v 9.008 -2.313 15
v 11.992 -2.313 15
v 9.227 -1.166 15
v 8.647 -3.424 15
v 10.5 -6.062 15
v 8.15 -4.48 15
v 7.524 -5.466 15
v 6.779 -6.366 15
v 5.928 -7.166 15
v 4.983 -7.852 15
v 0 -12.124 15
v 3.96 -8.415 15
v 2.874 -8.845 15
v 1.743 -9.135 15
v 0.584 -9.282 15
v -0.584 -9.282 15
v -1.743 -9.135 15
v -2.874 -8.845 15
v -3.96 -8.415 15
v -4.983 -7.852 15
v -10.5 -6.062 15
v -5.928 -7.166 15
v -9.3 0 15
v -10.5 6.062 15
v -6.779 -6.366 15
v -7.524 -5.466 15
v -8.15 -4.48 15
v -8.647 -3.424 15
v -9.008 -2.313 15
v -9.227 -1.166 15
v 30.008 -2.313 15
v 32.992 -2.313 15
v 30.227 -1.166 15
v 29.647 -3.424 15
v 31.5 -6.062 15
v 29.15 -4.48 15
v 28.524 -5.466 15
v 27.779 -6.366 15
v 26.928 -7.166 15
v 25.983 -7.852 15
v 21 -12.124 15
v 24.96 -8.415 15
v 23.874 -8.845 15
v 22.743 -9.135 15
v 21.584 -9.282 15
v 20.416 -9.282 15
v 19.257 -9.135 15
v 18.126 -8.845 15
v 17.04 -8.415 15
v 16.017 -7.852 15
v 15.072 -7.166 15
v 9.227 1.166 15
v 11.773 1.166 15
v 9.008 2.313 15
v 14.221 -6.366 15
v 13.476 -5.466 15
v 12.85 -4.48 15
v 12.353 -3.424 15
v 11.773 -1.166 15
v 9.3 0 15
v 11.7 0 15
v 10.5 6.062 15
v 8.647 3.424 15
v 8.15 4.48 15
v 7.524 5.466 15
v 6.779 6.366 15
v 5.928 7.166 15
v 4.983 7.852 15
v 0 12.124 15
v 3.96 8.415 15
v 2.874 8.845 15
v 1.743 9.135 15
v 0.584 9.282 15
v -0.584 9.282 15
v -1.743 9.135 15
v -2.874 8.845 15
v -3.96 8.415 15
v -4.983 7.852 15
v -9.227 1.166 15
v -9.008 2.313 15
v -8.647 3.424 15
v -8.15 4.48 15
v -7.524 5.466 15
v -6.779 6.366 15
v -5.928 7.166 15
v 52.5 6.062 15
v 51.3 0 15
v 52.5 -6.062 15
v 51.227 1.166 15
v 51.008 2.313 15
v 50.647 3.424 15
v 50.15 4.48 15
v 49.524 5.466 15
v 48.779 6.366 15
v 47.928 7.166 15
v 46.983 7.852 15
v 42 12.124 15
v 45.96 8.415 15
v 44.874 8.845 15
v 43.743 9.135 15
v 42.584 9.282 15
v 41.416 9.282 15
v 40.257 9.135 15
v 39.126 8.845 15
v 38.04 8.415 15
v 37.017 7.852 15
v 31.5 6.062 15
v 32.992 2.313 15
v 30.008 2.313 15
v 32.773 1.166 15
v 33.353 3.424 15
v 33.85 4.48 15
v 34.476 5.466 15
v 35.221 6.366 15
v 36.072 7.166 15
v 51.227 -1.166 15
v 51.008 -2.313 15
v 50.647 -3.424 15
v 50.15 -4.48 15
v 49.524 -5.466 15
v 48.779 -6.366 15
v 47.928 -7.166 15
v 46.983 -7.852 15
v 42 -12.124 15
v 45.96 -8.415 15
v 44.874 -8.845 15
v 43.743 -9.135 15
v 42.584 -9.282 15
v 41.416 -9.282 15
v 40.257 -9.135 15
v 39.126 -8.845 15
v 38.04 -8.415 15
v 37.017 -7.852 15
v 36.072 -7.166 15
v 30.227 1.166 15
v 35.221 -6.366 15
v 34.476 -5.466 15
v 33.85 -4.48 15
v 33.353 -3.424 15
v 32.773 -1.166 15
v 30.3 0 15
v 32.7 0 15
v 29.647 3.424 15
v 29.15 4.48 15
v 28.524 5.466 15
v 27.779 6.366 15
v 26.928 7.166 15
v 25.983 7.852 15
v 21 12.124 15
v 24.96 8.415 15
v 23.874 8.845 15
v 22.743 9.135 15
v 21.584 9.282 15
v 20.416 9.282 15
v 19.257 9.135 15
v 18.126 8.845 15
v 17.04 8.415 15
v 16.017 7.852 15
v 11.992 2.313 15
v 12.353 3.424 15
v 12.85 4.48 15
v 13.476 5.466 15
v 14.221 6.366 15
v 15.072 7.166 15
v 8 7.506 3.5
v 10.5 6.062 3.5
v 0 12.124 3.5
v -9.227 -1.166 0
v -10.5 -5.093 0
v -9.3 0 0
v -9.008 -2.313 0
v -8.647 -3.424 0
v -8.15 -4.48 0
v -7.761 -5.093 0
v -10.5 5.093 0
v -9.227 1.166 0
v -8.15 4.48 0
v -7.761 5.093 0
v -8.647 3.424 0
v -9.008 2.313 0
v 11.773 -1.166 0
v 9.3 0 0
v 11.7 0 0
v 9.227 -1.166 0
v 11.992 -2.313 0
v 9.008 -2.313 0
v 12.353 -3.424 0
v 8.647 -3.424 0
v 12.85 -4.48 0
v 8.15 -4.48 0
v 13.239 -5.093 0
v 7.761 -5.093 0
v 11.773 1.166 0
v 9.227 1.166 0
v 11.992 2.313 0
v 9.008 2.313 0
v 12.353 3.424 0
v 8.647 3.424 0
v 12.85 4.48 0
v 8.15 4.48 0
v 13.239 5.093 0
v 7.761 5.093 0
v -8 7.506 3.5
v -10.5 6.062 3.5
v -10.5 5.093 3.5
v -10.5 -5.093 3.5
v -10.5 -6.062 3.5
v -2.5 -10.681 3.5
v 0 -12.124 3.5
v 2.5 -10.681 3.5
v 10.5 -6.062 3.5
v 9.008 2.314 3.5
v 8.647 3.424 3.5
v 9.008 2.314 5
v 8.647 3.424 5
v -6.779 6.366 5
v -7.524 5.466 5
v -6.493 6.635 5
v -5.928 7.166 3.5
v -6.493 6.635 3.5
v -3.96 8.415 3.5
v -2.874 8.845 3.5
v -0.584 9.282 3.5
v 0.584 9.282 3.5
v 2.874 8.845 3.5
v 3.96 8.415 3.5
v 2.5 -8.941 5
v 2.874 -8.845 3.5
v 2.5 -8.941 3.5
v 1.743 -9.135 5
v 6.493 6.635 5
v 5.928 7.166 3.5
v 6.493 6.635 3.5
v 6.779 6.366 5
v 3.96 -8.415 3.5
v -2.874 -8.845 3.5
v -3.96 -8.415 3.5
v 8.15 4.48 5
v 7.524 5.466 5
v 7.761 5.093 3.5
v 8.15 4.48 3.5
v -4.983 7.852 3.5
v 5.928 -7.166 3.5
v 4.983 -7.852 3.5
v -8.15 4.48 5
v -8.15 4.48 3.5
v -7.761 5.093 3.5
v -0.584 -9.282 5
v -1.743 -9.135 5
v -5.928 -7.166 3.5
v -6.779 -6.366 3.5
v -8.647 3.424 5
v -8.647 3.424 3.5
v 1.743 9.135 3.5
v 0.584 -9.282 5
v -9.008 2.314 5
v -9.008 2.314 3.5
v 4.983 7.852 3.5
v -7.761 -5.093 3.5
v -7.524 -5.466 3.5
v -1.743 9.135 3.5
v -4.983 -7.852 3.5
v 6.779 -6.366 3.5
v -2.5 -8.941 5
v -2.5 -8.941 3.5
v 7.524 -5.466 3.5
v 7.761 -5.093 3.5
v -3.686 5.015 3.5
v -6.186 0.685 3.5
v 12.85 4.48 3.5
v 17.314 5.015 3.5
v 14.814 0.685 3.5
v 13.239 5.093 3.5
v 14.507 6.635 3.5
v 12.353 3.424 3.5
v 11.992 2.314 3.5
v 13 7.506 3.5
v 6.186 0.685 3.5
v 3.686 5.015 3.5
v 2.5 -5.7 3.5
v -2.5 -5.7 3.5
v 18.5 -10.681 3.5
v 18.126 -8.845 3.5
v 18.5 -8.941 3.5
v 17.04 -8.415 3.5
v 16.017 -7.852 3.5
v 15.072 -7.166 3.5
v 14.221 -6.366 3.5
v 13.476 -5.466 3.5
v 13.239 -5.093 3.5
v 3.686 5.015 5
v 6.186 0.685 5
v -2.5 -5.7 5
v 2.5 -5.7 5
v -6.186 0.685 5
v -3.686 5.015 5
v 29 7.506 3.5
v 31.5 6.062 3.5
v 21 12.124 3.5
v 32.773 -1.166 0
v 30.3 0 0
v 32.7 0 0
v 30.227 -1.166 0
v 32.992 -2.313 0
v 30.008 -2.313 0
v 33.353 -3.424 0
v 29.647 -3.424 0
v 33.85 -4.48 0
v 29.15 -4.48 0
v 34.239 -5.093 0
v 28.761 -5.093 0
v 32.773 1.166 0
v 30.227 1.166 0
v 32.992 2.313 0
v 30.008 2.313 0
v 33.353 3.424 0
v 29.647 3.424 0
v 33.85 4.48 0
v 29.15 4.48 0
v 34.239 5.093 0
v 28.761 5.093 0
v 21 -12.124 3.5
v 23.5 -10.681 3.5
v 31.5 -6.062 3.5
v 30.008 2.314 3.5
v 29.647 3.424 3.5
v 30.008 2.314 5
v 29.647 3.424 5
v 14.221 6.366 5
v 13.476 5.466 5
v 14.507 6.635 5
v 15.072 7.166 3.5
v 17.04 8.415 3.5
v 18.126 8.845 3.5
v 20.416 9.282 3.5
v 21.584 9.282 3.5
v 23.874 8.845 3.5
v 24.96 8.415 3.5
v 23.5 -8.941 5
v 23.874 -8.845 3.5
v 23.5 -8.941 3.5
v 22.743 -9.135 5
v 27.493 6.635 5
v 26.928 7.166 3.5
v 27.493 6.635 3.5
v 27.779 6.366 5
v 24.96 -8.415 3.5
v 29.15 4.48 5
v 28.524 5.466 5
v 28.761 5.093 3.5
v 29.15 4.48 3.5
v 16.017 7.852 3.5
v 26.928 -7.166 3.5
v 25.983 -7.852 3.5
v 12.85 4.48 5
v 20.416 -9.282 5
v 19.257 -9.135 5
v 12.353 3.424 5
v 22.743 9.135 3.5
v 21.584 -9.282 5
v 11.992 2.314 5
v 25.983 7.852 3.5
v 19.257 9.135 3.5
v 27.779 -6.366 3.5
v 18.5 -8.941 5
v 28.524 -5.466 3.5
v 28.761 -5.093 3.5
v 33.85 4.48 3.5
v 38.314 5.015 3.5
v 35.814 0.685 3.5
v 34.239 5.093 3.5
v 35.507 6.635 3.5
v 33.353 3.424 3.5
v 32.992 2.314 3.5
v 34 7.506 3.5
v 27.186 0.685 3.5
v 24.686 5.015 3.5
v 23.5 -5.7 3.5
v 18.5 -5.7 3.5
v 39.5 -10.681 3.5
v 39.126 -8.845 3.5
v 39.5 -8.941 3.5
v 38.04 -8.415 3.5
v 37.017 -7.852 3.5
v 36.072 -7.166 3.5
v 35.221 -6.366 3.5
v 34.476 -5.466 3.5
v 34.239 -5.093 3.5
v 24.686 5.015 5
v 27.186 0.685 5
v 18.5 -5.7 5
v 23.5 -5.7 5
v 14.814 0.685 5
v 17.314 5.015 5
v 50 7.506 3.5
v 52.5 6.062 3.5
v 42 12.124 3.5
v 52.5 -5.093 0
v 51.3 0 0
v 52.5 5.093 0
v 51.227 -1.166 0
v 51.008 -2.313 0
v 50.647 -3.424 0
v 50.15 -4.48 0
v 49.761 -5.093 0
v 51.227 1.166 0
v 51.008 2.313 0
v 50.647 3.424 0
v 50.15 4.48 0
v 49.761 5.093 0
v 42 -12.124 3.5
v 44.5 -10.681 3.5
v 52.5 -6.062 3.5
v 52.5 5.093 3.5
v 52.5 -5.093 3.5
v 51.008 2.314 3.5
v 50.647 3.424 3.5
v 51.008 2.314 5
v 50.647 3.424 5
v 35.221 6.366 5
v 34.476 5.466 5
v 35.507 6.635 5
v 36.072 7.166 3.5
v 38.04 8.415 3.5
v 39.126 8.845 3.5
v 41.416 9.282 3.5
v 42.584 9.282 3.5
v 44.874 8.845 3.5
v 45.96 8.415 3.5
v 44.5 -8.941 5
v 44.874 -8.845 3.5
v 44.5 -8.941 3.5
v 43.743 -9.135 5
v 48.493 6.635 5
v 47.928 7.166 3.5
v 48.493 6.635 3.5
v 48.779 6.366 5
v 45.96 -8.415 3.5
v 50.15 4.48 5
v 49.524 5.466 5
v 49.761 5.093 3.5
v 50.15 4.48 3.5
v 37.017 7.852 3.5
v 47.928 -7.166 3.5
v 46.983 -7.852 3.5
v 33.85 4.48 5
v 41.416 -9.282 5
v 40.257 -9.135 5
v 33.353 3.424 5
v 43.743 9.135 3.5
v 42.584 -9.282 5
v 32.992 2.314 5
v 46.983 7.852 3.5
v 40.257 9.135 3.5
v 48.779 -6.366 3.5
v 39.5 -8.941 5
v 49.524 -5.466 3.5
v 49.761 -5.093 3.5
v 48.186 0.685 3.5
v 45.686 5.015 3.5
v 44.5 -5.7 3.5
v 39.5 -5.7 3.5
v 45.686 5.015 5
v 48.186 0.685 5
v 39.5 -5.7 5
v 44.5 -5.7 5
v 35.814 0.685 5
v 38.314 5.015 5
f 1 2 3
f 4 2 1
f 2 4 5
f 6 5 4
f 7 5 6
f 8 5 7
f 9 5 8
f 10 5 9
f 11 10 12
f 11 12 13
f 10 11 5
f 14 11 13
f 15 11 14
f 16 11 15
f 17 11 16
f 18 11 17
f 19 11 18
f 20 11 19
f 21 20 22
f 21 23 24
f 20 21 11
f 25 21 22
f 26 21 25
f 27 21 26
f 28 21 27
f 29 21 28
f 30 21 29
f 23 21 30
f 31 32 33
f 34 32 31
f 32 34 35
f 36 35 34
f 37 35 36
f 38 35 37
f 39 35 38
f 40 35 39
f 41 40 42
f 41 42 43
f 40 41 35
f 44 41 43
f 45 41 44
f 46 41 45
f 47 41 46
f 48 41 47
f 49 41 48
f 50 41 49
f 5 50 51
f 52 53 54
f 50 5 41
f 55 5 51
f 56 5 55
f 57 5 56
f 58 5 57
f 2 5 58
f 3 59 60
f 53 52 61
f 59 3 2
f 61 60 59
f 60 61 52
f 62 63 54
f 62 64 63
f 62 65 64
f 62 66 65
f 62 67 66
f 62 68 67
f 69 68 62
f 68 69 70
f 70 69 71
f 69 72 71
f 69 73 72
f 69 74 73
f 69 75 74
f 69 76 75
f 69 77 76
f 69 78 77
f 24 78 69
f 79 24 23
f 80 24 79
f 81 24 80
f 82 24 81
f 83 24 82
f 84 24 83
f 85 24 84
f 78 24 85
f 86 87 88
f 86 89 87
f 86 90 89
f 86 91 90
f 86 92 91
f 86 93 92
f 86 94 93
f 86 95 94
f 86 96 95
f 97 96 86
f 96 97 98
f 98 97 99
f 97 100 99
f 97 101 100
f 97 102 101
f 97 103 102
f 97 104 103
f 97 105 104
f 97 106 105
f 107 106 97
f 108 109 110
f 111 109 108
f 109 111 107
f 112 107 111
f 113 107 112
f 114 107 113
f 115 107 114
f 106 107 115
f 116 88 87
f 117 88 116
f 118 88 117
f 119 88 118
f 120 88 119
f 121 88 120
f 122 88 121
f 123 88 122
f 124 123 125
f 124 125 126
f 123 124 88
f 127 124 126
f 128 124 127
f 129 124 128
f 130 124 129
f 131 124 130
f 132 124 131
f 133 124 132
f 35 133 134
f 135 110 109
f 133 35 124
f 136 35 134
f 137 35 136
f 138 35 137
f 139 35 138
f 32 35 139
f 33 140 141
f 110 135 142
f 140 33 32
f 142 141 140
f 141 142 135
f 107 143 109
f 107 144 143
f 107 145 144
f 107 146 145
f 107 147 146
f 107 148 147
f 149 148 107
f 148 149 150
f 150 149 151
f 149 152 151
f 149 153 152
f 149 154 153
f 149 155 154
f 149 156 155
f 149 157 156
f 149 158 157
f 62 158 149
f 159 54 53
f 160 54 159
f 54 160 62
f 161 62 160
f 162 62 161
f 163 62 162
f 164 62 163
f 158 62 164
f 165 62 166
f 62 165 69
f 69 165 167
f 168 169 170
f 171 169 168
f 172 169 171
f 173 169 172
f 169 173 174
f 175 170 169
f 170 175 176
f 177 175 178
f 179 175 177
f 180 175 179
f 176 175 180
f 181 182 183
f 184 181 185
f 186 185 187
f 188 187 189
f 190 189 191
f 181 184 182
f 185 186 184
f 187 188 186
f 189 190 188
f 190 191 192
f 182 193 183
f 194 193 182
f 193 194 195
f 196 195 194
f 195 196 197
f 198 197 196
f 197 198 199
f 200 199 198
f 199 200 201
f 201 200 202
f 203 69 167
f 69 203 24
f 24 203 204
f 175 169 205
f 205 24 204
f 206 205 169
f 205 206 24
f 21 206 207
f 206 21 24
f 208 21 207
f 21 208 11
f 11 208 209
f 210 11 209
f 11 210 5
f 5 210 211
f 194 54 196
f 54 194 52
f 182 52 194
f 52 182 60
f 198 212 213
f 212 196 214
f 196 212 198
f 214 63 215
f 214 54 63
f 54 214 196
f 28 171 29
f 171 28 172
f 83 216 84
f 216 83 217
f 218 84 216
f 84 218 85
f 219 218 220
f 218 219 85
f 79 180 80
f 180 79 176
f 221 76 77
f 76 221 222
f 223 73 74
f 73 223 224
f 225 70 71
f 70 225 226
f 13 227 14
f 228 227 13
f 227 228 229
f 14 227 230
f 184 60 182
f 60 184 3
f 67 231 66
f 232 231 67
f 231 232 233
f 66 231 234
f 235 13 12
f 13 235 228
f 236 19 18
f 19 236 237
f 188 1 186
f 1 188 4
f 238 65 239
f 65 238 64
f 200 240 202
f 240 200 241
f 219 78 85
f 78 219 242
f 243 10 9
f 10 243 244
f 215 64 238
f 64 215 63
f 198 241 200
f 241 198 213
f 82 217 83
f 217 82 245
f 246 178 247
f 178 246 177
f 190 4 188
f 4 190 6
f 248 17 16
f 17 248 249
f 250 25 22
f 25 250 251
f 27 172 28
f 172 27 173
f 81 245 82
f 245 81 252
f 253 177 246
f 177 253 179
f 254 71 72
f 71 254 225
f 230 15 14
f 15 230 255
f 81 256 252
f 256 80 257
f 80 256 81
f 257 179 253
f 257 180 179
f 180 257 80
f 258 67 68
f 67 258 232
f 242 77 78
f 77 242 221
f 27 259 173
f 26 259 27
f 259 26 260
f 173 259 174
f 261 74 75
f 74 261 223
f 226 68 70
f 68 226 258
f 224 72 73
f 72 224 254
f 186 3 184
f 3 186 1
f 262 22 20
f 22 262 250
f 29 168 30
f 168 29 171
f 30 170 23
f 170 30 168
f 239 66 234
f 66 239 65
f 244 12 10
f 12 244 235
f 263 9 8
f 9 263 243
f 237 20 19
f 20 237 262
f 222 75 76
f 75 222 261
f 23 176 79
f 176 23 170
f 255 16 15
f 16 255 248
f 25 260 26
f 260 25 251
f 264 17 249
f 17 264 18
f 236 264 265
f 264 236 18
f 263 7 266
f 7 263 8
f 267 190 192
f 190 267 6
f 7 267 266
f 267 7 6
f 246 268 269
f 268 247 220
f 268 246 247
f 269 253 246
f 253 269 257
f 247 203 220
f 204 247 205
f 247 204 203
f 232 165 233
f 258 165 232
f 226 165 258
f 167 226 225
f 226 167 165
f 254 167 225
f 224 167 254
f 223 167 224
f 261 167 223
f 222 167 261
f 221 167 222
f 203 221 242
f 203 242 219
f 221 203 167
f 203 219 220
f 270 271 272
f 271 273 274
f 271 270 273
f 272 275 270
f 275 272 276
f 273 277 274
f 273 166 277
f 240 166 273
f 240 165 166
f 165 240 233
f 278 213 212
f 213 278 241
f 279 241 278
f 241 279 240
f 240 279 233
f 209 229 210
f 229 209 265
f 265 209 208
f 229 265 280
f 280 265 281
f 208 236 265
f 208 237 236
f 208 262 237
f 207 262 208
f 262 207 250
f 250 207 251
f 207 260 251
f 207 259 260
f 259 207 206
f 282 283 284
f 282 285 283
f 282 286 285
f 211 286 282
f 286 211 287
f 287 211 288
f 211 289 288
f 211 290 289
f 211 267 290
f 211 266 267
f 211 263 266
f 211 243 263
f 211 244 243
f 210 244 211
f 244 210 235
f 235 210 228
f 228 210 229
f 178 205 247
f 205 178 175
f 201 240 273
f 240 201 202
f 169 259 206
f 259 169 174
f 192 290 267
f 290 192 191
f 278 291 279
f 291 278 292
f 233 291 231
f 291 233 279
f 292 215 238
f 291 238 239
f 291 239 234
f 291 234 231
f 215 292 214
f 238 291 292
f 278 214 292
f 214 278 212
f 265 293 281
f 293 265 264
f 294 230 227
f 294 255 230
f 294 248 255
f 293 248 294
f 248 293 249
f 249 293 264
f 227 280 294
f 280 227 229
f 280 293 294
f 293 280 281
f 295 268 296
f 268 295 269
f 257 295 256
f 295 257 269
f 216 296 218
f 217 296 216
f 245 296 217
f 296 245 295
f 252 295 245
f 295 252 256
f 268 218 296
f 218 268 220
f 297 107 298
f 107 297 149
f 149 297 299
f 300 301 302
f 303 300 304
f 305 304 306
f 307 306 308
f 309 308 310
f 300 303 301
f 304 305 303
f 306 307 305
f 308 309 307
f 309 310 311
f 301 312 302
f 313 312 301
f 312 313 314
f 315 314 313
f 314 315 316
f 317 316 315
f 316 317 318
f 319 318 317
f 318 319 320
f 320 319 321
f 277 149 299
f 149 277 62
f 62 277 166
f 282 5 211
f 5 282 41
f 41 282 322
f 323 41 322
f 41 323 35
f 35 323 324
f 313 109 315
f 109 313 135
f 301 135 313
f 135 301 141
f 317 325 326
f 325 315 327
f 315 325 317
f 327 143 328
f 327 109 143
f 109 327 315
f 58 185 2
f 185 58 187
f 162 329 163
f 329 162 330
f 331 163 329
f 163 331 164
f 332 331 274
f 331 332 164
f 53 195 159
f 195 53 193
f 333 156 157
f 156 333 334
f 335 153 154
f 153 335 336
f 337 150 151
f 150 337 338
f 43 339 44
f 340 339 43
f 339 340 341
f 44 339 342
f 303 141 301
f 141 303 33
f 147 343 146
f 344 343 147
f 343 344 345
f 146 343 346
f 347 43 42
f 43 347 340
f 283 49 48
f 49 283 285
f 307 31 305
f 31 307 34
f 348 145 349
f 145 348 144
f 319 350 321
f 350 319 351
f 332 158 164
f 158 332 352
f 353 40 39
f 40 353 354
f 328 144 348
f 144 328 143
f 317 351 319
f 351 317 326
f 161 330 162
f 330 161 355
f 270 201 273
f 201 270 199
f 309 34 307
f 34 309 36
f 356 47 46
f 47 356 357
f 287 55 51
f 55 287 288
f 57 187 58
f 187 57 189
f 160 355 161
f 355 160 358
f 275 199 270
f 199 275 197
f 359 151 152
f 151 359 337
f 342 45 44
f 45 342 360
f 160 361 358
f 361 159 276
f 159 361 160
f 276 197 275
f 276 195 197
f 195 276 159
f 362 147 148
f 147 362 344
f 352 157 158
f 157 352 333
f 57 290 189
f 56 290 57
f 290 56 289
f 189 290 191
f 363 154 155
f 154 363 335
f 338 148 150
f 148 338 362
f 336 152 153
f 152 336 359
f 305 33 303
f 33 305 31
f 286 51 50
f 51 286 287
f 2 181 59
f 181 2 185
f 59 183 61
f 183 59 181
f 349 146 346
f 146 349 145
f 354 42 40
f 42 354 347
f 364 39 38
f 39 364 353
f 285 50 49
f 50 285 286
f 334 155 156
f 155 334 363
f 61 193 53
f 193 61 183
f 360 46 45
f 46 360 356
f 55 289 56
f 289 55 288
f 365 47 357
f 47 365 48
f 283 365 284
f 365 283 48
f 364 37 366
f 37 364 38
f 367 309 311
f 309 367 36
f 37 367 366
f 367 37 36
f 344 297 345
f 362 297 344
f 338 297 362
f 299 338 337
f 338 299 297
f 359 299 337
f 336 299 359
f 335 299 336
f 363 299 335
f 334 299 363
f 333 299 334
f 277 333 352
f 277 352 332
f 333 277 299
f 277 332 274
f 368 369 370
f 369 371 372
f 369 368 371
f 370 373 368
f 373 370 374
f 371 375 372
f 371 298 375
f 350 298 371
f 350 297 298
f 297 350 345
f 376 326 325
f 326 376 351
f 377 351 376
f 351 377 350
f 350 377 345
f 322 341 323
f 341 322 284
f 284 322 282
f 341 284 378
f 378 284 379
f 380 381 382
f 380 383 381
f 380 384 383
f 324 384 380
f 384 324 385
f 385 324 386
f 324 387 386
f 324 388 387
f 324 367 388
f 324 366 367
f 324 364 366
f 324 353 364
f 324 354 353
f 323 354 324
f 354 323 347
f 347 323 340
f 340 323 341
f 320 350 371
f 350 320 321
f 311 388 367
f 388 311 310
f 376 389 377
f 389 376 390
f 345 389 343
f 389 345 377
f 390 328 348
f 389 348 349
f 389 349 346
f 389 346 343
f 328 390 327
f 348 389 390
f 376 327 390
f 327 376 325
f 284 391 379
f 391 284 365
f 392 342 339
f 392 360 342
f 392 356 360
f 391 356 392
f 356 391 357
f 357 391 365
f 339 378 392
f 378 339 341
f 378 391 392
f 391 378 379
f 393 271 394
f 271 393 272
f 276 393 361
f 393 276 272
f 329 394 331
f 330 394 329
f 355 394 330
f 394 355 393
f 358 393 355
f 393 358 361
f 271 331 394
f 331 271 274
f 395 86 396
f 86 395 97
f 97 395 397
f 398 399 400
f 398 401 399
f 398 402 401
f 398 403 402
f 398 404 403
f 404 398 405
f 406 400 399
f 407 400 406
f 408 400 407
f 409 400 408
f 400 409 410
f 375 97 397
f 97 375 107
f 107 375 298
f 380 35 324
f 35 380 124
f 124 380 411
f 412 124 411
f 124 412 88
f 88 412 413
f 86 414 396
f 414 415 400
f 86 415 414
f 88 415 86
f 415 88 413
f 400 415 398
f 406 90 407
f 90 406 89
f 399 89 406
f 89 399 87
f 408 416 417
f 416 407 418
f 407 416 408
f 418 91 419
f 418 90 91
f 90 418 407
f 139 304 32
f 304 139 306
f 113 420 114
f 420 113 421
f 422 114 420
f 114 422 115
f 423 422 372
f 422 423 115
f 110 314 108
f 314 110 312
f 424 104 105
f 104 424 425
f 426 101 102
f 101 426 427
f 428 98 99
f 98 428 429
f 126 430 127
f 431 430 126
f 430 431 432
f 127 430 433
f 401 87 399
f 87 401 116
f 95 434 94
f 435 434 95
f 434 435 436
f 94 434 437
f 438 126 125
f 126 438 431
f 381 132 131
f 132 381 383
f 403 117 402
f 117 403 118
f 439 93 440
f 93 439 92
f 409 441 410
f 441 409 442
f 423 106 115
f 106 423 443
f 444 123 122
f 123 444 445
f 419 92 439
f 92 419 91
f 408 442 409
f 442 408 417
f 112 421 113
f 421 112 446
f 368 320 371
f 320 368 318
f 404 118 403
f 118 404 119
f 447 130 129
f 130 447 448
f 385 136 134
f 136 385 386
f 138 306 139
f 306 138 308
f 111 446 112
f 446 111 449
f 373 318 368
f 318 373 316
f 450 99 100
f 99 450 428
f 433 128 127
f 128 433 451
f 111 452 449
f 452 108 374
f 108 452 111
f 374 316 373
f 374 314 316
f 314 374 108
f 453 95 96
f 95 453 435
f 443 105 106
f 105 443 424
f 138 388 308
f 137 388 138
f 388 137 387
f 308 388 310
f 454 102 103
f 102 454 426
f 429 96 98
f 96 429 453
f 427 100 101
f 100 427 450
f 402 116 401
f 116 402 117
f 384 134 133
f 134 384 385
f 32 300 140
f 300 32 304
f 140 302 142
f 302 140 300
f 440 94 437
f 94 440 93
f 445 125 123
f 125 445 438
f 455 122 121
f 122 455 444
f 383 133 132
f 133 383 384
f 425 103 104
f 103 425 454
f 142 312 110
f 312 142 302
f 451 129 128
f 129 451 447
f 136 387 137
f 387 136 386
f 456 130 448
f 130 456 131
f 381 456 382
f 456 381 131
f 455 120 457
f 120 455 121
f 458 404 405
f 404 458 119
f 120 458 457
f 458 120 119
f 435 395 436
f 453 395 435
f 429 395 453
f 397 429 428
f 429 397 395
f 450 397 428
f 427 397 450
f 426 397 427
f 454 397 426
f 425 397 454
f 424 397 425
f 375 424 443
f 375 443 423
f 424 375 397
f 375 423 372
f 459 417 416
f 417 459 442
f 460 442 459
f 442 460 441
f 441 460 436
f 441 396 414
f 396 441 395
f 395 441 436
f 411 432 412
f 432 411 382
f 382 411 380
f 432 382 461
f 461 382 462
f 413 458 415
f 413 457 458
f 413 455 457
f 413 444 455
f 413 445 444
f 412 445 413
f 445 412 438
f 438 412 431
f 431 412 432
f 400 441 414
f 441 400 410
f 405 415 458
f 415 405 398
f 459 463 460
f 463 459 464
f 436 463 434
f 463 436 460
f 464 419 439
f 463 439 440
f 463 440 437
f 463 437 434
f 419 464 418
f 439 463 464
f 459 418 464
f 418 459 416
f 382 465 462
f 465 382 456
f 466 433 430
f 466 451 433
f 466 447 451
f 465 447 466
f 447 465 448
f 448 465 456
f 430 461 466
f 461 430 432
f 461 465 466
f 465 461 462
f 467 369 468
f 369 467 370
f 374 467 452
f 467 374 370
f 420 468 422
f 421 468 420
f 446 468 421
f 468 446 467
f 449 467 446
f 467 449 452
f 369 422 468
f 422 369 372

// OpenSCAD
// https://github.com/Addy771/Hex-Cell-Holder
// This script generates models of cell holders and caps for 
// building battery packs using cylindrical cells. 
// Original concept by ES user "SpinningMagnets"
// More info can be found here:
// https://endless-sphere.com/forums/viewtopic.php?f=3&t=90058
//
// This file was created by Addy and is released as public domain
// Contributors
// Albert Phan - Added boxes and optimizations


///////////////////////////////////////////////////////////////////////////////////////////////////////////
// BASIC CONFIGURATION
/////////////////////////////////////////////////////////////////////////////////////////////////////////////


cell_dia = 18.6;    // Cell diameter default = 18.4 for 18650s **PRINT OUT TEST FIT PIECE STL FIRST**
cell_height = 65;	// Cell height default = 65 for 18650s
wall = 1.2;         // Wall thickness around a single cell. Make as a multiple of the nozzle diameter. Spacing between cells is twice this amount. default = 1.2

num_rows = 1;       
num_cols = 3;

holder_height = 15; // Total height of cell holder default = 15
slot_height = 3.5;  // Height of all slots default = 3.5 mm is a good size for 14 awg solid in slots


col_slot_width = 4; // Width of slots between rows default = 6
row_slot_width = 8; // Width of slots along rows default = 6

pack_style = "rect";	// "rect" for rectangular pack, "para" for parallelogram

wire_style = "bus";		// "strip" to make space to run nickel strips between cells.
						// "bus" to make space for bus wires between rows

box_style = "boLT";		// "bolt" for bolting the box pack together
						// "ziptie" for using zipties to fasten the box together. (ziptie heads will stick out), 
						// "both" uses bolts for the 4 corners and zipties inbetween. Useful for mounting the pack to something with zipties but while still using bolts to hold it together

part_type = "normal";   // "normal","mirrored", or "both". "assembled" is used for debugging.  You'll want a mirrored piece if the tops and bottom are different ( ie. When there are even rows in rectangular style or any # of rows in parallelogram. The Console will tell you if you need a mirrored piece).

part = "holder";   		// "holder" to generate cell holders, 
						// "cap" to generate pack end caps, 
						// "box lid" to generate box lid
						// "box bottom" for box bottom
						// "wire clamp" for strain relief clamp
						
						// Note: There are no boxes for parallelogram packs.

box_lip = true;			// Adds a lip to the box pieces. default = true.

cap_wall = 1.2;				// Cap wall thickness (default = 1.2 recommend to make a multiple of nozzle dia)
cap_clearance = 0.2;		// Clearance between holder and caps default = 0.2

box_wall = 2.0;				// Box wall thickness (default = 2.0 recommend to make at least 4 * multiple of nozzle dia)
box_clearance = 0.2;		// Clearance between holder and box default = 0.2


// Box clearances for wires 
bms_clearance = 8; 			// Vertical space for the battery management system (bms) on top of holders, set to 0 for no extra space
box_bottom_clearance = 0;	// Vertical space for wires on bottom of box
box_wire_side_clearance = 3; // Horizontal space from right side (side with wire hole opening) to the box wall for wires
box_nonwire_side_clearance = 0; // Horizontal space from left side (opposite of wire hole) to the box wall for wires

wire_diameter = 2;			// Diameter of 1 power wire used in the strain relief clamps default = 5 for 10 awg stranded silicon wire
wire_clamp_bolt_dia = 3;	// Bolt dia used for clamping wire default = 3 for M3 bolt
clamp_factor = 0.7;			// Factor of wire diameter to be clamped. Higher number is less clamping force (default=0.7 max=1.0)
bolt_dia = 3;				// Actual dia of bolt default = 3 for M3 bolt
bolt_head_dia = 6;			// Actual dia of bolt head default = 6 for M3 socket head bolt
bolt_head_thickness = 3;	// Thickness (height) of bolt head default = 3 for M3 Socket head
ziptie_width = 8;
ziptie_thickness = 2.5;


///////////////////////////////////////////////////////////////////////////////////
// ADVANCED CONFIGURATION for users that need to customize everything
//////////////////////////////////////////////////////////////////////////////////

opening_dia = cell_dia;   		// Circular opening to expose cell default = 12
separation = 1.5;   			// Separation between cell top and wire slots (aka tab thickness) default = 1.5
wire_hole_width = 15;		// Width of wire hole default = 15
wire_hole_length = 10;		// Length of the wireclamp that sticks out default = 10
wire_top_wall = 4;			// Thickness of top wire wall default = 4mm
clamp_plate_height = 4;		// default = 4
bolt_dia_clearance = 1;		// Amount of extra diameter for bolt holes default = 1
cell_tab_width = 5;			// Width of tab that keeps the cell in the holder default = 5
cell_tab_length = 3;		// Approx Length of tab that keeps the cell in the holder default = 3
box_lip_height = box_wall * 0.75;	// Height of lip default = box_wall * 0.75



//////////////////////////////////////////////////////
// Don't forget to do a test fit print
//////////////////////////////////////////////////////

// END OF CONFIGURATION
////////////////////////////////////////////////////////////////////////

// TODO: 
// [x] fix and optimize para cap
// [x] fix lid support for bottom using bms clearance instead of box_bottom_clearance
// [x] add box_lip_height between box and lid
//		[x] add box_lip_height parameter to rectcap negative to do it
// [x] add side clearance
// [x] fix wire hole for different box wire clearances
// [x] fix wire_hole_length for large values
// [x] add wire strain relief clamp
// [x] add clamp to part_type
// [x] add abilty to remove faulty cells easily
// [x] add default values in comments for config vars
// [x] cleanup old code that uses hex()
// [x] fix bus cuts with new hole style 
// [x] work on strength of tab holders (make thicker)
// [x] echo for length, height, and width of box
// [x] #5 Fix lid_support issues with even rows
// [x] #3 Fix wire hole support generating too much over the box.
// [x] Change instances of box_clearance used in the x direction to box_clearance_x because box_clearance is only true in the y direction, for box_clearance in x, you must use the x component of box_clearance ( * cos(30))
// [x] #4 Fix zipties and bolt holes generate in same hole for cols 2 or less
// [x] #6 Fix box_clearance value changes lip height
// [x] Add option to have no lip for box for printing with thin box walls

///////////////////////////////////////////////////////////////////////////
// NON-Configurable helper variables
///////////////////////////////////////////////////////////////////////////
$fn = 50;       // Number of facets for circular parts. 
hextra = 0.0001; // enlarge hexes by this to make them overlap
extra = 1;    	// for proper differences()
spacing = 4;    // Spacing between top and bottom pieces
box_lid_height = (holder_height)-(holder_height-slot_height)/2+(box_clearance+box_wall) + bms_clearance;	// box lid to middle of holder
box_bottom_height = get_mock_pack_height() + 2 * (box_wall + box_clearance) + bms_clearance + box_bottom_clearance - box_lid_height;
hex_w = (cell_dia + 2*wall);		// Width of one hex cell
hex_pt = (hex_w/2) / cos(30); 	// Half the distance of point to point of a hex aka radius
cell_radius = cell_dia/2;
box_clearance_x = box_clearance * cos(30);	// Used whenever we are translating in the x direction from the hexes
box_wall_x = box_wall * cos(30);			// Used whenever we are translating in the x direction from the hexes 

wire_clamp_support = hex_pt + box_clearance + box_wall - wire_hole_width/2 ;		// Place for strain relief clamp to screw into
wire_clamp_nib_dia = 5;

if (part_type == "mirrored")
{
    if (part == "cap")
    {    
        mirror([1,0,0])
            regular_cap();
    }
    else if (part == "holder")    
    {
        mirror([1,0,0])
            regular_pack();
    }
}
else if(part_type == "both")
{
    if (part == "cap")
	{
        regular_cap();
	}
    else if (part == "holder")
        regular_pack();
	else if (part == "box lid" || part == "box bottom")
	{
		regular_box_bottom();
		translate([0,-(hex_pt * 2 + 2 * (box_wall + box_clearance) + spacing), 0])
		mirror([0,0,1])
			rotate([180,0,0])
				regular_box_lid();
	}
    if(num_rows % 2 == 1)   // If odd pack move pack over to nest properly
    {

        mirror([1,0,0])
		{
            if (part == "cap")
                translate([-hex_w*(num_cols - 0.5), 1.5*(hex_pt)*(num_rows+1) + spacing,0])
                    regular_cap();
            else if (part == "holder")
                translate([-hex_w*(num_cols - 0.5), 1.5*(hex_pt)*num_rows + spacing,0])
                    regular_pack();
		}
    }
    else
    {
        
        mirror([1,0,0])
            if (part == "cap")
                translate([-hex_w*(num_cols - 0.5),1.5*(hex_pt)*(num_rows+1) + spacing,0])
                    regular_cap();
			
            else if (part == "holder")

                translate([-hex_w*(num_cols - 1),1.5*(hex_pt)*num_rows + spacing,0])
                    regular_pack();
    }
}
else if(part_type == "assembled")
{
	
	mock_pack();	// for debugging for now
	translate([0,0,box_bottom_height + box_lid_height - 2 * (box_wall + box_clearance) - box_bottom_clearance])
		mirror([0,0,1])
		{
			color("green", alpha = 0.7)
			regular_box_lid();
			color("orange", alpha = 0.7)
					translate([(get_hex_length(num_cols + 1) + box_wire_side_clearance + box_wall + box_clearance + wire_hole_length/2),0,box_lid_height-box_wall-box_clearance])
						mirror([0,0,1])
							wire_clamp();
		}
			
	
		color("lightgreen", alpha = 0.7)
			translate([0,0,-box_bottom_clearance])
				regular_box_bottom();

	translate([(get_hex_length(num_rows+2)+ 2*(box_wall + box_clearance) + box_nonwire_side_clearance + box_wire_side_clearance)*2,get_hex_length_pt(num_cols+2) + 2*(box_wall + box_clearance),0])
	{
		mock_pack();	// for debugging for now  - 2 * (box_wall + box_clearance) - bms_clearance
		translate([0,0,get_mock_pack_height() + bms_clearance])
			mirror([0,0,1])
			{
				color("green", alpha = 0.7)
				regular_box_lid();
				color("orange", alpha = 0.7)
					translate([(get_hex_length(num_cols + 1) + box_wire_side_clearance + box_wall + box_clearance + wire_hole_length/2),0,box_lid_height-box_wall-box_clearance])
						mirror([0,0,1])
							wire_clamp();
			}
	
		
	}

	translate([(get_hex_length(num_rows+2)+ 2*(box_wall + box_clearance) + box_nonwire_side_clearance + box_wire_side_clearance)*4,(get_hex_length_pt(num_cols+2) + 2*(box_wall + box_clearance)) * 3,0])
		{
			mock_pack();	// for debugging for now
			color("lightgreen", alpha = 0.7)
				translate([0,0,-(box_bottom_clearance)])
					regular_box_bottom();

		}

				

}
else if(part_type == "mock pack")
{
	mock_pack();
}
else	// if Normal
{
    if (part == "cap")  
	{
        regular_cap();
	}
    
    else if (part == "holder")
        regular_pack();
	else if (part == "box lid")
	{
		translate([0,get_hex_length_pt(num_cols),0])
		mirror([0,0,1])
			rotate([180,0,0])
				regular_box_lid();
	}
	else if (part == "box bottom")
	{
		regular_box_bottom();
	}
	else if (part == "wire clamp")
		wire_clamp();

}

/////////////////////////////////////////////////////////////////////////////////////////////////////////
// echos and info
echo(pack_height_holder = get_mock_pack_height());
echo(box_lid_height = box_lid_height);
echo(box_bottom_height = box_bottom_height);
echo(box_total_length = get_box_total_length());
echo(box_total_width = get_box_total_width());

echo(total_width_holder = get_hex_length_pt(num_rows)+hex_pt*2);
if (pack_style == "rect")
{
    // Rectangular style
    echo(total_length_holder=get_holder_rect_length());
	if((num_rows % 2) == 0) // Even?
		
    echo("\n******************************************************* \n Top and bottom are different. Don't forget to do a mirrored holder\n*******************************************************");
}
else if(pack_style == "para")
{
	// Parallelogram style
    echo(total_length_holder=hex_w*(num_cols+0.5*(num_rows-1)));
	echo("\n******************************************************* \n Top and bottom are different. Don't forget to do a mirrored holder\n*******************************************************");
}

if (part_type == "mirrored" && (part == "box lid" || part == "box bottom"))
	echo("\n******************************************************* \n Please choose Normal for box lid or box bottom as there aren't mirrored versions of them.\n*******************************************************");
	 
if (pack_style == "para" && (part == "box lid" || part == "box bottom"))
	echo("\n******************************************************* \n There are currently no boxes for parallelogram style\n*******************************************************");




//////////////////////////////////////////////////////////////////////////////////////////////////////////////

// This module generates a cap for a para style holder
module para_cap(cap_wall = cap_wall, cap_clearance = cap_clearance,cap_height = holder_height,positive_x = 0, negative_x = 0, positive_y = 0, negative_y = 0)
{
	difference()
	{
		// Positive Hull	
		para_cap_positive(cap_wall,cap_clearance,cap_height,positive_x,negative_x,positive_y,negative_y);
		// Negative Hull
		para_cap_negative(cap_wall,cap_clearance,cap_height,positive_x,negative_x,positive_y,negative_y);
	}
}

// Generates a positive of the paracap which is to be cut out with the negative
module para_cap_positive(cap_wall,cap_clearance,cap_height = holder_height,positive_x = 0, negative_x = 0, positive_y = 0, negative_y = 0)
{
	translate([0,0,-(cap_wall + cap_clearance)])
		hull()
		{
			// Generate 4 hexes in each corner and hull them together
			// [0,0] Bottom left
			translate([-negative_x,-negative_y,0])
				hex(cap_height,hex_pt + cap_wall + cap_clearance);
			// [1,0] Bottom right
			translate([get_hex_length(num_cols)+ positive_x,-(negative_y),0])
				hex(cap_height,hex_pt + cap_wall + cap_clearance);
			// [0,1] Top left
			translate([get_hex_length(num_rows/2 +0.5)-(negative_x),get_hex_length_pt(num_rows) + positive_y,0])
				hex(cap_height,hex_pt + cap_wall + cap_clearance);
			//  [1,1] Top right
			translate([get_hex_length(num_cols + num_rows/2-0.5) + positive_x,get_hex_length_pt(num_rows) + positive_y,0])
				hex(cap_height,hex_pt + cap_wall + cap_clearance);
		}
}

// Generates negative of the paracap to be cut out in a difference()
module para_cap_negative(cap_wall,cap_clearance,cap_height = holder_height,positive_x = 0, negative_x = 0, positive_y = 0, negative_y = 0)
{
		hull()
		{
			// Generate 4 hexes in each corner and hull them together
			// [0,0] Bottom left
			translate([-negative_x,-negative_y,0])
				hex(cap_height,hex_pt + cap_clearance);
			// [1,0] Bottom right
			translate([get_hex_length(num_cols)+ positive_x,-(negative_y),0])
				hex(cap_height,hex_pt + cap_clearance);
			// [0,1] Top left
			translate([get_hex_length(num_rows/2 +0.5)-(negative_x),get_hex_length_pt(num_rows) + positive_y,0])
				hex(cap_height,hex_pt  + cap_clearance);
			//  [1,1] Top right
			translate([get_hex_length(num_cols + num_rows/2-0.5) + positive_x,get_hex_length_pt(num_rows) + positive_y,0])
				hex(cap_height,hex_pt + cap_clearance);

		}
}


module rect_cap(cap_wall = cap_wall, cap_clearance = cap_clearance,cap_height = holder_height,positive_x = 0, negative_x = 0, positive_y = 0, negative_y = 0)
{
	difference()
	{
		// Positive Hull	
		rect_cap_positive(cap_wall,cap_clearance,cap_height,positive_x,negative_x,positive_y,negative_y);
		// Negative Hull
		rect_cap_negative(cap_wall,cap_clearance,cap_height,positive_x,negative_x,positive_y,negative_y);
		
	}
} 

// Generates the rectangular cap positive piece used in rect_cap and box. Default height is holder height
// height includes wall thickness and clearance
// Z Origin is -(cap_wall + cap_clearance)
// Positive_x = amount of clearance between the positive x box wall and the holder.
// Negative_x = amount of clearance between the negative x box wall and the holder.
// Same goes for y

module rect_cap_positive(cap_wall,cap_clearance,cap_height = holder_height,positive_x = 0, negative_x = 0, positive_y = 0, negative_y = 0)
{
	translate([0,0,-(cap_wall + cap_clearance)])
		hull()
		{
			// Generate 4 hexes in each corner and hull them together
			// [0,0] Bottom left
			translate([-negative_x,-negative_y,0])
				hex(cap_height,hex_pt + cap_wall + cap_clearance);
			// [1,0] Bottom right
			translate([get_hex_length(num_cols + 0.5)+ positive_x,-(negative_y),0])
				hex(cap_height,hex_pt + cap_wall + cap_clearance);
			// [0,1] Top left
			translate([-(negative_x),get_hex_length_pt(num_rows) + positive_y,0])
				hex(cap_height,hex_pt + cap_wall + cap_clearance);
			//  [1,1] Top right
			translate([get_hex_length(num_cols + 0.5) + positive_x,get_hex_length_pt(num_rows) + positive_y,0])
				hex(cap_height,hex_pt + cap_wall + cap_clearance);
		}
}

// Generates the rect_cap negative piece (as a positive to be cut out using difference) used in rect_cap and box. This is basically the same as rect_cap_positive but the hexes are smaller by cap_wall and
// z origin = 0
// TODO: With rect_cap_negative now very similiar to rect_cap_positive, is it really required anymore?
module rect_cap_negative(cap_wall,cap_clearance,cap_height = holder_height,positive_x = 0, negative_x = 0, positive_y = 0, negative_y = 0)
{
		hull()
		{

			// Generate 4 hexes in each corner and hull them together
			// [0,0] Bottom left
			translate([-negative_x,-negative_y,0])
				hex(cap_height,hex_pt + cap_clearance);
			// [1,0] Bottom right
			translate([get_hex_length(num_cols + 0.5)+ positive_x,-(negative_y),0])
				hex(cap_height,hex_pt + cap_clearance);
			// [0,1] Top left
			translate([-(negative_x),get_hex_length_pt(num_rows) + positive_y,0])
				hex(cap_height,hex_pt  + cap_clearance);
			//  [1,1] Top right
			translate([get_hex_length(num_cols + 0.5) + positive_x,get_hex_length_pt(num_rows) + positive_y,0])
				hex(cap_height,hex_pt + cap_clearance);
		}
}
module regular_cap()
{
    if (pack_style == "rect")
        rect_cap();
    else if (pack_style == "para")
        para_cap();
}

module regular_box_lid()
{
	
	if (pack_style == "rect")
	{
		difference()
		{

		
			union()
			{
				
				difference()
				{
					union()
					{
						// Positive
						rect_cap_positive(box_wall,box_clearance,box_lid_height,box_wire_side_clearance, box_nonwire_side_clearance);
						// Lip Positive ( lip is added to box_lid and subtracted from box_bottom)
						if(box_lip)
						{
							translate([0,0,box_lid_height - box_wall/2])
								rect_cap_positive(box_wall/2,box_clearance,box_lip_height,box_wire_side_clearance,box_nonwire_side_clearance);
						}

						
						// Wire support hole
						translate([(num_cols * hex_w + box_wire_side_clearance + box_clearance_x + box_wall_x) - (box_wall_x + box_clearance_x + hex_w/2 + extra),-(wire_hole_width + 2 * (wire_clamp_support)) /2,-(box_wall + box_clearance)])
							cube([wire_hole_length + box_wall_x + box_clearance_x + hex_w/2 + extra,wire_hole_width + 2 * (wire_clamp_support),box_lid_height]);
						
					}
					// Negatives
					rect_cap_negative(box_wall,box_clearance,box_lid_height*2,box_wire_side_clearance,box_nonwire_side_clearance);
					// Wire hole cutout
					translate([(num_cols)*hex_w+box_clearance_x + box_wall_x +box_wire_side_clearance,0,wire_top_wall - box_wall + box_lid_height/2])
						cube([(wire_hole_length + box_wall_x + box_clearance_x + hex_w/2) * 2 + box_wall *3,wire_hole_width,box_lid_height], center = true);
					// Strain relief bolt cutouts
					translate([(num_cols)*hex_w+box_clearance_x + box_wall_x + box_wire_side_clearance + wire_hole_length/2,(wire_hole_width + wire_clamp_support)/2,0])
						cylinder(d = wire_clamp_bolt_dia * 0.9, h=wire_top_wall + box_lid_height);
					translate([(num_cols)*hex_w+box_clearance_x + box_wall_x + box_wire_side_clearance + wire_hole_length/2,-(wire_hole_width + wire_clamp_support)/2,0])
						cylinder(d = wire_clamp_bolt_dia * 0.9, h=wire_top_wall + box_lid_height);
				}
				// Lid supports
				if(box_lip)
					both_lid_supports(box_lid_height + box_lip_height, bms_clearance);
				else
					both_lid_supports(box_lid_height, bms_clearance);
				
				
			}
			// Other cutouts of entire box lid
			pick_hole_style(lid = true);
		}
		
	}
	
    else if (pack_style == "para")
    // para box;
	;
}

module regular_box_bottom()
{
	if(pack_style == "rect")
	{
		difference()
		{
			union()
			{
				rect_cap(box_wall,box_clearance,box_bottom_height,box_wire_side_clearance,box_nonwire_side_clearance);
				both_lid_supports(box_bottom_height,box_bottom_clearance);
			}

			// Other cutouts of entire box bottom
			// Lip cutout
			if(box_lip)
			{
				translate([0,0,box_bottom_height-(box_wall+box_clearance)-box_lip_height])
					rect_cap_negative(box_wall,box_clearance + box_wall/2,box_lid_height,box_wire_side_clearance,box_nonwire_side_clearance);
			}
			pick_hole_style();
		}
	}
	else if (pack_style == "para")
    // para box;
	;
}

// Creates a mock pack for debugging
// Origin is the bottom of the center of the first hex cell
module mock_pack()
{
	
	color("blue") render(1)regular_pack();
	// add 18650s
	if(pack_style == "rect")
	{
		for(x = get_hex_center_points_rect(num_rows,num_cols))
		 {
			// Iterate through each hex center and place a cell
			translate([x[0],x[1],slot_height + separation])
				color("CornflowerBlue")mock_cell();

		 }
	}
	else if(pack_style == "para")
	{
		for(x = get_hex_center_points_para(num_rows,num_cols))
		 {
			// Iterate through each hex center and place a cell
			translate([x[0],x[1],slot_height + separation])
				color("CornflowerBlue")mock_cell();
		 }
	}
	
	color("blue")
		translate([0,0,slot_height + separation + cell_height + slot_height + separation])
			mirror([0,0,1])
				render(1)regular_pack();
}

// Creates a mock cell. Origin is bottom of 1st hex cell holder.
module mock_cell()
{
	cylinder(d = cell_dia, h = cell_height);
}

module regular_pack()
{
	translate([0,0,holder_height])
		union()
		{
			for(row = [0:num_rows-1])
			{
				
				if (pack_style == "rect")
				{
					if ((row % 2) == 0)
					{            
						translate([0,1.5*(hex_pt)*row,0])
						for(col = [0:num_cols-1])
						{
							translate([hex_w*col,0,0])
								pick_hex();
						}                
					}
					else
					{
						translate([0.5 * hex_w,1.5*(hex_pt)*row,0])
						for(col = [0:num_cols-1])
						{
							translate([hex_w*col,0,0])
								pick_hex();
						}
					}
				}
				else if (pack_style == "para")
				{
					translate([row*(0.5 * hex_w),1.5*(hex_pt)*row,0])
					for(col = [0:num_cols-1])
					{
						translate([hex_w*col,0,0])
							pick_hex();
					}

				}
			}
		}      
}


module pick_hex()
{
    if (wire_style == "strip")
        strip_hex();
    else if (wire_style == "bus")
	{
        bus_hex();
	}
    else
        strip_hex();
}


module strip_hex()
{
	mirror([0,0,1])
	{
		difference()
		{
			union()
			{
				// Hex block
				hex(holder_height, hex_pt + hextra);
			}
			
					
			// Top opening    
			translate([0,0,-1])
				cylinder(h=holder_height+2,d=opening_dia);
			  
			// Cell space    
			cylinder(h=2 *(holder_height-slot_height-separation) ,d=cell_dia, center=true);
			
			// 1st column slot
			rotate([0,0,60])
				translate([0,0,holder_height])    
					cube([hex_w+1,col_slot_width,2*slot_height], center=true);    
				
			// 2nd column slot
			rotate([0,0,-60])
				translate([0,0,holder_height])    
					cube([hex_w+1,col_slot_width,2*slot_height], center=true);
		   
			// Row slot 
			translate([0,0,holder_height]) 
				cube([hex_w+1,row_slot_width,2*slot_height], center=true);   
		} 
		cell_tabs();

	}
}


module bus_hex()
{
	mirror([0,0,1])
	{
		difference()
		{
			// Hex block
			hex(holder_height, hex_pt + hextra);
					
			// Top opening    
			translate([0,0,-1])
				cylinder(h=holder_height+2,d=opening_dia);
			  
			// Cell space    
			cylinder(h=2 *(holder_height-slot_height-separation) ,d=cell_dia, center=true);
		
				
			// 1st column slot
			rotate([0,0,60])
				translate([0,0,holder_height])    
					cube([hex_w+1,col_slot_width,2*slot_height], center=true);    
				
			// 2nd column slot    
			rotate([0,0,-60])
				translate([0,0,holder_height])    
					cube([hex_w+1,col_slot_width,2*slot_height], center=true);
					
			// Row slot A
			translate([0,(hex_pt*cos(60) + hex_pt)/2,holder_height]) 
				cube([hex_w + extra,row_slot_width,2*slot_height], center=true);  
			  
			// Row slot B    
			translate([0,-(hex_pt*cos(60) + hex_pt)/2,holder_height]) 
				cube([hex_w + extra,row_slot_width,2*slot_height], center=true);
		}
		cell_tabs();
	}	
}
module cell_tabs()
{
	// Tabs
		for(a = [1,3,5])
		{
			intersection()
			{
				translate([ cell_radius*sin(a*60),cell_radius*cos(a*60),holder_height-(separation/2 + slot_height)])
				rotate([0,0,a*30])cube([cell_tab_length * 2 + wall, cell_tab_width, separation],center=true);
				hex(holder_height, hex_pt + hextra);
			}
			

			
		}  
}
// Generates support for the box for bolts and zipties. spacer parameter addes a spacer incase there is extra space on the boxes for wires.
module both_lid_supports(lid_support_height = box_lid_height, spacer = 0)
{
	intersection()
	{
		union()
		{
				
			// Generate +y side of supports
			lid_support(lid_support_height,spacer);

			// Generate -y side of supports
			// if even, translate over half a hex
			if(num_rows % 2 == 0)
				translate([get_hex_length(num_cols + 0.5),get_hex_length_pt(num_rows),0])
					rotate([0,0,180])
						lid_support(lid_support_height,spacer);
			else	
				translate([0,get_hex_length_pt(num_rows),0])
					mirror([0,1,0])
							lid_support(lid_support_height,spacer);

		}
		// Remove all pieces outside of the box
		rect_cap_positive(box_wall/2,box_clearance,lid_support_height + extra,box_wire_side_clearance,box_nonwire_side_clearance);
	}
	


	
}

// Generates the support to hold the holders in the box lid and bottom.
// spacer sets height for bms clearance
// mirrored is used for the -y lid_support which will have different sizes due to different side clearances
module lid_support(lid_support_height = box_lid_height,spacer = 0)
{
	for(col = [1:num_cols])
	{
		// iterate on one side
		// add support in the shape of a hex inbetween cols
		difference()
		{
			union()
			{
				translate([get_hex_length(col+0.5),-get_hex_length_pt(2)-box_clearance,-(box_wall + box_clearance)])
				hex(lid_support_height);
				if(spacer)
				{
					translate([get_hex_length(col)+hex_w/2,-row_slot_width/2 -hex_pt/2,spacer/2])
						cube([hex_w/2,hex_pt,spacer],center = true);
				}
				
			}
			// Cutouts
			translate([get_hex_length(col+0.5),-hex_pt*2 - (box_wall + box_clearance) + box_wall/2,-box_wall - lid_support_height/2 -extra])
			{
				cube([hex_pt*2 + extra,hex_pt*2,lid_support_height*5],center = true);
			}
		}
	}
}


// Picks the correct hole style based on configuration
module pick_hole_style(lid = false)
{
		// Other cutouts of entire box lid
		if (box_style == "ziptie")
		{
			both_ziptie_holes();
		}
		else if (box_style == "bolt")
		{
			// if holes are for lid, make them bolt size, otherwise for the bottom, use the tap size and no bolt head
			if(lid)
				both_bolt_holes(bolt_dia + bolt_dia_clearance, bolt_head_dia + bolt_dia_clearance,[1:num_cols]);
			else
			{
				both_bolt_holes(bolt_dia * 0.9, bolt_dia * 0.9,[1:num_cols]);

			}
				
		}
		else if (box_style == "both")
		{
			if(lid)
				both_bolt_holes(bolt_dia + bolt_dia_clearance, bolt_head_dia + bolt_dia_clearance,[1,num_cols]);
			else
				both_bolt_holes(bolt_dia * 0.9,bolt_dia * 0.9,[1,num_cols]);

			// Don't generate ziptie holes for both style when 2 columns or less
			if(num_cols > 2)
				both_ziptie_holes(ziptie_width, ziptie_thickness,[2:num_cols-1]);
			
		}
}

module both_ziptie_holes(ziptie_width = ziptie_width,ziptie_thickness = ziptie_thickness,range = [1:num_cols])
{
	ziptie_holes(ziptie_width,ziptie_thickness,range);
	
	// if even, translate over half a hex
	if(num_rows % 2 == 0)
		translate([get_hex_length(num_cols +0.5),get_hex_length_pt(num_rows),0])
			rotate([0,0,180])
				ziptie_holes(ziptie_width,ziptie_thickness,range);
	else	
		translate([0,get_hex_length_pt(num_rows),0])
			mirror([0,1,0])
					ziptie_holes(ziptie_width,ziptie_thickness,range);

}
// Holes for ziptie
module ziptie_holes(ziptie_width = ziptie_width,ziptie_thickness = ziptie_thickness, range = [1:num_cols])
{
	for(col = range)
	{
			// Cutout ziptie holes
			translate([-hex_w/2 + col * hex_w,-hex_pt + 0.5 *(box_wall + box_clearance),box_bottom_height/2-box_wall-box_clearance])
			{
				cube([ziptie_width,ziptie_thickness,box_bottom_height*2],center = true);
			// Cutout for ziptie head (cuts through lid however, should think of a better solution maybe bolts instead?)
			// translate([0,ziptie_head_thickness/2-ziptie_thickness/2,-(box_lid_height/2-box_wall-box_clearance)- (box_wall + box_clearance) + ziptie_head_length/2 - extra/2])
			// 	cube([ziptie_head_width,ziptie_head_thickness,ziptie_head_length + extra],center = true);
			}	
	}
}

module both_bolt_holes(bolt_dia,bolt_head_dia, range = [1:num_cols])
{
	bolt_holes(bolt_dia,bolt_head_dia, range);
	// if even, translate over half a hex
	if(num_rows % 2 == 0)
		translate([get_hex_length(num_cols +0.5),get_hex_length_pt(num_rows),0])
			rotate([0,0,180])
				bolt_holes(bolt_dia,bolt_head_dia, range);
	else	
		translate([0,get_hex_length_pt(num_rows),0])
			mirror([0,1,0])
					bolt_holes(bolt_dia,bolt_head_dia, range);
}
// Creates a positive model of the bolt holes and the bolt heads
module bolt_holes(bolt_dia,bolt_head_dia, range = [1:num_cols])
{
	for(col = range)
	{
			// Cutout bolt holes
			translate([-hex_w/2 + col * hex_w,-hex_pt + 0.5 *(box_wall + box_clearance),box_lid_height/2-box_wall-box_clearance])
			{
				cylinder(d = bolt_dia, h = box_bottom_height*2,center = true);
			translate([0,0,-(box_lid_height/2-box_wall-box_clearance)- (box_wall + box_clearance) - extra])
				cylinder(d = bolt_head_dia, h = bolt_head_thickness + extra);
			}	
	}
}

// Part which clamps down the wires for strain relief
// Z origin is top of the mounting plate
module wire_clamp()
{
	translate([0,0,-clamp_plate_height/2])
	{
		difference()
		{
			union()
			{
				clamp_height = box_lid_height - wire_top_wall - box_clearance - wire_diameter * clamp_factor;
				cube([wire_hole_length,wire_hole_width + 2 * wire_clamp_support,clamp_plate_height],center = true);
				// To top of plate
				translate([0,0,wire_top_wall/2])
				{
					translate([0,0,(clamp_height - wire_clamp_nib_dia/2)/2]) 
						cube([wire_hole_length,wire_hole_width - extra, clamp_height - wire_clamp_nib_dia/2], true);
					translate([0,(wire_hole_width - extra)/2,(clamp_height) - wire_clamp_nib_dia/2])
						rotate([90,0,0])
							cylinder(d = wire_clamp_nib_dia, h = wire_hole_width - extra);
				}
				
			}
			// Bolt hole cutout
			translate([0,(wire_hole_width + wire_clamp_support)/2,-wire_top_wall])
				cylinder(d = wire_clamp_bolt_dia + bolt_dia_clearance, h = wire_top_wall * 2);
			translate([0,-(wire_hole_width + wire_clamp_support)/2,-wire_top_wall])
				cylinder(d = wire_clamp_bolt_dia + bolt_dia_clearance, h = wire_top_wall * 2);
		}
		
		
	}

}

// Generates a hex of cap_height tall and hex_pt radius by default.
module hex(cap_height = holder_height,hex_pt = hex_pt)
{
		linear_extrude(height=cap_height, convexity = 10)
			polygon([ for (a=[0:5])[hex_pt*sin(a*60),hex_pt*cos(a*60)]]);	

}

// returns total box width
function get_box_total_width()
= 2 * (box_clearance + box_wall) + get_holder_width();

// returns holder width
function get_holder_width()
= get_hex_length_pt(num_rows) + hex_pt * 2;



// returns length of the longest part of box (from side of lid to wireclamp) 
// Reminder: Rect box only.
function get_box_total_length()
= 2 * (box_clearance + box_wall) + get_holder_rect_length() + box_wire_side_clearance + box_nonwire_side_clearance + wire_hole_length;

// returns length of rect holders
function get_holder_rect_length()
= hex_w*(num_cols+0.5);

 

// returns height of the mock pack
function get_mock_pack_height() 
= 2 * (slot_height + separation) + cell_height;
// returns the length of the center of one hex cell on a row to number to hexes passed to function
function get_hex_length(num_cell)
= (num_cell-1) * hex_w;

// returns the length of the center of vertical(columns) hex cells to number to hexes passed to function
function get_hex_length_pt(num_cell)
= (num_cell-1) * hex_pt*1.5;

// returns a list of the hex cell centers of a given num of rows and columns for para packs.
function get_hex_center_points_para(num_rows, num_cols)
=  [
		// Iterate through num of rows and cols
		for(row = [0:num_rows-1],col = [0:num_cols-1]) 
		[	// X component of list member
			row*(0.5 * hex_w) + hex_w * col
			,	
			// Y component of list member
			row * 1.5 * (hex_pt)
		]
	];	// Closing function bracket

// returns a list of the hex cell centers of a given num of rows and columns for rect packs.
function get_hex_center_points_rect(num_rows, num_cols)
=  [
	// Iterate through num of rows and cols
	for(row = [0:num_rows-1],col = [0:num_cols-1]) 
	[	// X component of list member
		row % 2 == 0 ? // if even
		hex_w * col :
		//else	
		0.5 * hex_w + hex_w * col
		,	
		// Y component of list member
		 row * 1.5 * (hex_pt)
		 ]
	];	// Closing function bracket
